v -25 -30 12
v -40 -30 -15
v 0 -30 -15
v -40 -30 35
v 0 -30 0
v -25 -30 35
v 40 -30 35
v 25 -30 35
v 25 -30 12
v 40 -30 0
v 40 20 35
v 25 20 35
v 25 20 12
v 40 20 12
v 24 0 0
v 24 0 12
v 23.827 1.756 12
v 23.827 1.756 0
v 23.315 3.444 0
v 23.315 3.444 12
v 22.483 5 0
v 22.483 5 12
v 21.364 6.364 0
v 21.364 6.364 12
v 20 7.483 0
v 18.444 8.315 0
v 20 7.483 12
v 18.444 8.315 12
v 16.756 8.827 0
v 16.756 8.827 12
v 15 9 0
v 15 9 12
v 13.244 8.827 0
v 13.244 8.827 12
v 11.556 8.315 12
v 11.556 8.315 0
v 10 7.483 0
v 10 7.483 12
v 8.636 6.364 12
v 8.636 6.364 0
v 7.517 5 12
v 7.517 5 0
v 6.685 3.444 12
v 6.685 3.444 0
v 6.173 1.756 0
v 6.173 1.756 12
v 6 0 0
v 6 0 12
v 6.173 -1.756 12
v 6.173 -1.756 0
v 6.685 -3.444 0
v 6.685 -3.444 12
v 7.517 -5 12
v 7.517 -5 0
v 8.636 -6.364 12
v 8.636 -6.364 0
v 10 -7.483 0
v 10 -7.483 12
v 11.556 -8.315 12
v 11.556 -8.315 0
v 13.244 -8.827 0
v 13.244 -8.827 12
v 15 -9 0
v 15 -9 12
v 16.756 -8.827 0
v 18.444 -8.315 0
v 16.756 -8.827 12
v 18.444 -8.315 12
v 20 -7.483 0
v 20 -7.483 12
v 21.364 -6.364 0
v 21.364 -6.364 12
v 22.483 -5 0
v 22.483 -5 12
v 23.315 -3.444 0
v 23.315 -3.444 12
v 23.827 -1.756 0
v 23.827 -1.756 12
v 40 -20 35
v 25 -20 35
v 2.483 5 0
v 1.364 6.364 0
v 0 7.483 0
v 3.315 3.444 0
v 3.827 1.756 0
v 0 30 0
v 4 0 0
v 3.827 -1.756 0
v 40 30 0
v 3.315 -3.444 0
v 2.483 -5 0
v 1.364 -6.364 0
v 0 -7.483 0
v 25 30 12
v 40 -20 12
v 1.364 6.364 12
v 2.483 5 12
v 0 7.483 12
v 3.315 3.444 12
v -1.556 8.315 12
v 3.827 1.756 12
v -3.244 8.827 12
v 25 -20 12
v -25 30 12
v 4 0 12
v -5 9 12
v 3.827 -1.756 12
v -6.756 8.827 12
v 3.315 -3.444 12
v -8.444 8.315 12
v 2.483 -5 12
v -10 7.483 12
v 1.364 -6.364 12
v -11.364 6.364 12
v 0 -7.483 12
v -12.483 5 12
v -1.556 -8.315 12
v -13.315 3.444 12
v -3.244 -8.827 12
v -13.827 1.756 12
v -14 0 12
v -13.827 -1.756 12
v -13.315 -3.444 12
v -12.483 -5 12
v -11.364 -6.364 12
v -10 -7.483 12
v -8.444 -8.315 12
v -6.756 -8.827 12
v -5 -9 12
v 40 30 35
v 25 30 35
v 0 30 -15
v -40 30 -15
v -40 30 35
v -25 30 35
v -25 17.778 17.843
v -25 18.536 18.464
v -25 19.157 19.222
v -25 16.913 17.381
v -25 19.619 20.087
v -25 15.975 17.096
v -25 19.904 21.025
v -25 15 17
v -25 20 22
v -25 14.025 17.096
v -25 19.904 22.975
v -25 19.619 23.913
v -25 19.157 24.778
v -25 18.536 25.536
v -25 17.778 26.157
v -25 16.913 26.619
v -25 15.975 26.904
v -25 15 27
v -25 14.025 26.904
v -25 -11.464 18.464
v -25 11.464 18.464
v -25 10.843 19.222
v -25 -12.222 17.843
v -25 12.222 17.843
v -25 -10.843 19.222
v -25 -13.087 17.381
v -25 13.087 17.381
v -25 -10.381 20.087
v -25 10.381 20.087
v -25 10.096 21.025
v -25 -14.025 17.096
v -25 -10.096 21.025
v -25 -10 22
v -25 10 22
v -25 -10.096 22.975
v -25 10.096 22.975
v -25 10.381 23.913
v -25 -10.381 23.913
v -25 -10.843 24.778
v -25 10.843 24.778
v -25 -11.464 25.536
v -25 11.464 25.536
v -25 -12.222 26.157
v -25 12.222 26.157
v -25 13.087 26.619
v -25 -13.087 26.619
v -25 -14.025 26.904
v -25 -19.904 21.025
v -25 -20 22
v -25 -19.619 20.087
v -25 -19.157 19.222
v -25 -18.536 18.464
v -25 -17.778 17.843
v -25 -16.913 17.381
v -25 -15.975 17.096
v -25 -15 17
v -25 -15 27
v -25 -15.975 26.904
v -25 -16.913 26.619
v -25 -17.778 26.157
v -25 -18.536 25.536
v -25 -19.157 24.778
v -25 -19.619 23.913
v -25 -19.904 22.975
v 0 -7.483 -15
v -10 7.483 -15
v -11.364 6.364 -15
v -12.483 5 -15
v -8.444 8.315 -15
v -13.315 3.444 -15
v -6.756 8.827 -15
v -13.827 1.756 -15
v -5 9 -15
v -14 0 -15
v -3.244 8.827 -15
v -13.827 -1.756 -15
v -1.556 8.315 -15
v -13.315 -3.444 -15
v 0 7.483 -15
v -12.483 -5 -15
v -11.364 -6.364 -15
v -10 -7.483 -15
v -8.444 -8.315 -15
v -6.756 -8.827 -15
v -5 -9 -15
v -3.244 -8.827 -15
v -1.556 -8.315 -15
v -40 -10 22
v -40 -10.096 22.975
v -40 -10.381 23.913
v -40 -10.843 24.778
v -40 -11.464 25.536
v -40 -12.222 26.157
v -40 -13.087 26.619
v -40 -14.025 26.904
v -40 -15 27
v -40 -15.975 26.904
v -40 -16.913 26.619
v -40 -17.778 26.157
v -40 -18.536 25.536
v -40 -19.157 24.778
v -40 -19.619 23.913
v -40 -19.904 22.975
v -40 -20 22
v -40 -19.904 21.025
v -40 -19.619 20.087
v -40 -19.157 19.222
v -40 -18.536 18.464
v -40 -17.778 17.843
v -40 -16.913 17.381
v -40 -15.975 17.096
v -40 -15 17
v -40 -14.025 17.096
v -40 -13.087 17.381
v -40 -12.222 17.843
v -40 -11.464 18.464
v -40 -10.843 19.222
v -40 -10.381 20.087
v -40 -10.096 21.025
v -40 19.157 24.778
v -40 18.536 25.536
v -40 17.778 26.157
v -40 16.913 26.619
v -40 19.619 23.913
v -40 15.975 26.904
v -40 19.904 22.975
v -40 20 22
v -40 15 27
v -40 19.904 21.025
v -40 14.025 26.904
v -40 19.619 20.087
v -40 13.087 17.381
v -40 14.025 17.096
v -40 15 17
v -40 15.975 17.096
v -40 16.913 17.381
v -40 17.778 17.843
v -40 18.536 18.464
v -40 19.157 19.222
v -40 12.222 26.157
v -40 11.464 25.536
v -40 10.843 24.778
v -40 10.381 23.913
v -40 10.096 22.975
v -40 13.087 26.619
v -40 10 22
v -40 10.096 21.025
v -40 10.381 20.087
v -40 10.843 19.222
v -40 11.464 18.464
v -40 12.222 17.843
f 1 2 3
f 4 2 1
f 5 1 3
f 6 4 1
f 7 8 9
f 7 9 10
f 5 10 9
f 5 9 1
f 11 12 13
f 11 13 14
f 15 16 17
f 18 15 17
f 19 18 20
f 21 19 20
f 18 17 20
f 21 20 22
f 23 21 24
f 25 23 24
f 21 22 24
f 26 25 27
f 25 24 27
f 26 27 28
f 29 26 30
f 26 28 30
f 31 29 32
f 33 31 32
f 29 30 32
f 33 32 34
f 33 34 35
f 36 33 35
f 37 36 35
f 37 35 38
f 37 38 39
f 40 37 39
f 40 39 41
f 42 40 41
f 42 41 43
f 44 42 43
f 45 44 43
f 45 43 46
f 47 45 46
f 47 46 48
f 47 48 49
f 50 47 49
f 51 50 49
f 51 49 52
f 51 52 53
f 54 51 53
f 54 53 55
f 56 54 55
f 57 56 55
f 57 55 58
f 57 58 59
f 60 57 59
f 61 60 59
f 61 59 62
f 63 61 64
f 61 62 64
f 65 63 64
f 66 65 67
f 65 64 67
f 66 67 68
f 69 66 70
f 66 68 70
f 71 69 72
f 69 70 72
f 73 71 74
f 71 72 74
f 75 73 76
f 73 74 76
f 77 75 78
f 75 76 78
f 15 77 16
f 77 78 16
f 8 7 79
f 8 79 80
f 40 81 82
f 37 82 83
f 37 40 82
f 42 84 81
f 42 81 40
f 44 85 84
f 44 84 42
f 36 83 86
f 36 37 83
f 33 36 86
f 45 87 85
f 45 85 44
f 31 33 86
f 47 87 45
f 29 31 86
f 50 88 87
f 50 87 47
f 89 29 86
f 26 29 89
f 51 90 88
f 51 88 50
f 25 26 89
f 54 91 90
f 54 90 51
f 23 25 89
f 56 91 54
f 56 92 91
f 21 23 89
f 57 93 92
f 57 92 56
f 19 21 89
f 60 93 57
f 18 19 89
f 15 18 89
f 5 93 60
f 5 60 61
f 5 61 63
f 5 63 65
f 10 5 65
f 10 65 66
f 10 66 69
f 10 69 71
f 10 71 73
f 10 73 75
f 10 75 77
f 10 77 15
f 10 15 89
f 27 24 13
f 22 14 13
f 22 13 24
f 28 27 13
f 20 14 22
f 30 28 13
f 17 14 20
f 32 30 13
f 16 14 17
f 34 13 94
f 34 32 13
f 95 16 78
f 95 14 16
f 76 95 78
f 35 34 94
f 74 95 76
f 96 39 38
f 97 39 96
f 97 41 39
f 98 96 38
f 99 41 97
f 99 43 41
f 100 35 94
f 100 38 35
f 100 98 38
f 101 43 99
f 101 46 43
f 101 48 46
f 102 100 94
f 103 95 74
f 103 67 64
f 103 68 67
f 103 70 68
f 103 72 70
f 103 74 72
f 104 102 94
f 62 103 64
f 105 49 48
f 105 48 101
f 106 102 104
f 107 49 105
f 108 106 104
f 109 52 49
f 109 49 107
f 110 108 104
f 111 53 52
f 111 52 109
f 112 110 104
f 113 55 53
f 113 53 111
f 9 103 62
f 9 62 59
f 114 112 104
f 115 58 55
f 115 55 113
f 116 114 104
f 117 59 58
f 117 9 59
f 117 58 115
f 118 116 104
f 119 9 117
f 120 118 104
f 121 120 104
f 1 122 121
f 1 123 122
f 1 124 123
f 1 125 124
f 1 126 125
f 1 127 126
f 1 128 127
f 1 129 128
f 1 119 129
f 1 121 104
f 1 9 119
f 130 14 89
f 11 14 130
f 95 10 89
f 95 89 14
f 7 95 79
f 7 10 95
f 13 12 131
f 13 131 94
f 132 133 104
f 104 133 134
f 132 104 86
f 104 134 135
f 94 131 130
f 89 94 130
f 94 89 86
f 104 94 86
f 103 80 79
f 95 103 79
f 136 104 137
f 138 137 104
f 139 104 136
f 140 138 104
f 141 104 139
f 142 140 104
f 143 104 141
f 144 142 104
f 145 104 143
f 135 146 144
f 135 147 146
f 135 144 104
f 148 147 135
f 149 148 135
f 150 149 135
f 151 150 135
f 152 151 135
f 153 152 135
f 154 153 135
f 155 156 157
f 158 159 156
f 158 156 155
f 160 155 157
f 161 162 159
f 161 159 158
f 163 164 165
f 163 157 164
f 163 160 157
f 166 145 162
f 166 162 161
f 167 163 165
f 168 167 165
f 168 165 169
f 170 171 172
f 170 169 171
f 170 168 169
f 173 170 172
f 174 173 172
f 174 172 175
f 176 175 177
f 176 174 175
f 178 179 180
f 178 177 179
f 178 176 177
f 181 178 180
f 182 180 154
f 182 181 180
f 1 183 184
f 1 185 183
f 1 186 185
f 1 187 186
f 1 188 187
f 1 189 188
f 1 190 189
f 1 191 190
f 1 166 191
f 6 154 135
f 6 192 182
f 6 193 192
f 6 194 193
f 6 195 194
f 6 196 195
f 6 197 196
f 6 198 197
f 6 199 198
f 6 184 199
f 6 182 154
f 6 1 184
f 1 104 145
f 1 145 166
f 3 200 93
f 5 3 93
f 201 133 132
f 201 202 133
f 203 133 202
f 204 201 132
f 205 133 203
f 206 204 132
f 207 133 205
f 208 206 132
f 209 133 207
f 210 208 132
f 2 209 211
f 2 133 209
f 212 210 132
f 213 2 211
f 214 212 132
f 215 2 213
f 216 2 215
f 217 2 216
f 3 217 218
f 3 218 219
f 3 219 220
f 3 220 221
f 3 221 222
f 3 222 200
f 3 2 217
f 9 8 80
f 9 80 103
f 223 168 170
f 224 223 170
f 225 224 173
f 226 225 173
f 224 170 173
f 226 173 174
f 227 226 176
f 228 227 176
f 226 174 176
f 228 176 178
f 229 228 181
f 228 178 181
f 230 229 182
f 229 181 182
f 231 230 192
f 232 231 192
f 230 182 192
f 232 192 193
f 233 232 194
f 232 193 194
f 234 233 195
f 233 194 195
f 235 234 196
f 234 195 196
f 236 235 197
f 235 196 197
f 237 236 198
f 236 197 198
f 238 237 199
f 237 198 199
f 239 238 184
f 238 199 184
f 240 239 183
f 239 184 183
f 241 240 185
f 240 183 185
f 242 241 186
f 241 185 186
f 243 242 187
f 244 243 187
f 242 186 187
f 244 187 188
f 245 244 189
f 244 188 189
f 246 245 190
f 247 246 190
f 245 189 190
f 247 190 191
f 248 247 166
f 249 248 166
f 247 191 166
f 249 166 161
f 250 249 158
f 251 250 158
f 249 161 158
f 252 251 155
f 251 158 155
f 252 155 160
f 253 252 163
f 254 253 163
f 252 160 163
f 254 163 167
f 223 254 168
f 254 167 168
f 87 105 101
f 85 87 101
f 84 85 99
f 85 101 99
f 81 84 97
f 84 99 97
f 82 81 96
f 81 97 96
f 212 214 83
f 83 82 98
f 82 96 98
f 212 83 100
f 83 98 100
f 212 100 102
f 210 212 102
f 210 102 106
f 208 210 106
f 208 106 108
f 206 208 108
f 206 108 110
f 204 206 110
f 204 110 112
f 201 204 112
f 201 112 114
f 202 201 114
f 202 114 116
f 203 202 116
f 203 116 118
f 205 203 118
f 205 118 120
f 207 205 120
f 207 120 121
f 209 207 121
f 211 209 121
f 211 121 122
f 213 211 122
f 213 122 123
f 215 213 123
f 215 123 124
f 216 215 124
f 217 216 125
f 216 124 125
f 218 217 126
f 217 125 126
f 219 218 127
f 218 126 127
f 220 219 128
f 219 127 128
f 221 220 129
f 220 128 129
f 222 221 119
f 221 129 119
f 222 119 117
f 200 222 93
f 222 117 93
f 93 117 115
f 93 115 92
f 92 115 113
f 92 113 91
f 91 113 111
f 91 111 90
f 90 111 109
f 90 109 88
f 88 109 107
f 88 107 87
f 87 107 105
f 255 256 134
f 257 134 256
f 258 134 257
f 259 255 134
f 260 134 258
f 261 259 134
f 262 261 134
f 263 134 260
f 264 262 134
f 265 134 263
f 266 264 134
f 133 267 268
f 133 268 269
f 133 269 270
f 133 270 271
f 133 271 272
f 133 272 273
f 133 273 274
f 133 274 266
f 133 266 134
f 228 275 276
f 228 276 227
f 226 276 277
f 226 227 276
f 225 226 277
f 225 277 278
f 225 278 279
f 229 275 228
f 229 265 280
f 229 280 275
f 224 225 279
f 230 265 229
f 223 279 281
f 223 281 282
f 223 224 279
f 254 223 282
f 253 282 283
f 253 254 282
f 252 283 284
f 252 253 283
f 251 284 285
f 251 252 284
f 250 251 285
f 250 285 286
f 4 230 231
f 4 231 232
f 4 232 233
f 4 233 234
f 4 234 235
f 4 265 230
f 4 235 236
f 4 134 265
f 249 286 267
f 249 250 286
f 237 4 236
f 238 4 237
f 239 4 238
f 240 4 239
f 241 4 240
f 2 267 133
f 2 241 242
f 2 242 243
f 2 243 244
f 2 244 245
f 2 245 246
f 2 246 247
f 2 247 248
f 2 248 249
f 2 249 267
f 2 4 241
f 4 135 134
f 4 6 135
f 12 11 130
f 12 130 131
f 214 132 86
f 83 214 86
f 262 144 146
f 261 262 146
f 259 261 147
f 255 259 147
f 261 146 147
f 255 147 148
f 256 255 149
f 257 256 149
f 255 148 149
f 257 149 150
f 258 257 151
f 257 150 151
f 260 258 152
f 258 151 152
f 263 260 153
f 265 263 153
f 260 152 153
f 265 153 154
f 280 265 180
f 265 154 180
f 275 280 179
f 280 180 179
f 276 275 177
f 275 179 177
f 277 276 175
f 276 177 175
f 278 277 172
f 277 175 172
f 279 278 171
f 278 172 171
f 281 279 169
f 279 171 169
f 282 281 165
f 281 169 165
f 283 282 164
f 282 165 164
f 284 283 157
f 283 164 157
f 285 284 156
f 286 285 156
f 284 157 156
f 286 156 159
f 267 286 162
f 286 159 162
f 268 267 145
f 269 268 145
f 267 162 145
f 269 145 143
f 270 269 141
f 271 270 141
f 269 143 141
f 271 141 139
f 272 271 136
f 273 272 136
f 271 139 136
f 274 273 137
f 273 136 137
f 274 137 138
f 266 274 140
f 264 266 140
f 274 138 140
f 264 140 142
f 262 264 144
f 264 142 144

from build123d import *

# Parameters (mm, degrees)
F1_DEPTH = 30
F2_W     = 15
F2_H     = 40
F3_DEPTH = 23
F4_R     = 5
F5_DEPTH = 15
F6_R     = 9
F7_DEPTH = 27


with BuildPart() as f1:
    # F0 (on Front) → F1 (new body, symmetric)
    with BuildSketch(Plane.XZ):
        Polygon((-25, 35), (-40, 35), (-40, -15), (0, -15), (0, 0), (40, 0), (40, 35), (25, 35), (25, 12), (-25, 12), align=None)
    extrude(amount=F1_DEPTH, both=True)

    # F2 (on face) → F3 (cut, through all)
    with BuildSketch(Plane.XY.offset(35)):
        with Locations((32.5, 0)):
            Rectangle(F2_W, F2_H)
    extrude(amount=-F3_DEPTH, mode=Mode.SUBTRACT)

    # F4 (on face) → F5 (cut, through all)
    with BuildSketch(Plane.YZ.offset(-25)):
        with Locations((-15, 22)):
            Circle(F4_R)
        with Locations((15, 22)):
            Circle(F4_R)
    extrude(amount=-F5_DEPTH, mode=Mode.SUBTRACT)

    # F6 (on face) → F7 (cut, through all)
    with BuildSketch(Plane.XY.offset(12)):
        with Locations((-5, 0)):
            Circle(F6_R)
        with Locations((15, 0)):
            Circle(F6_R)
    extrude(amount=-F7_DEPTH, mode=Mode.SUBTRACT)


solid = f1.part
